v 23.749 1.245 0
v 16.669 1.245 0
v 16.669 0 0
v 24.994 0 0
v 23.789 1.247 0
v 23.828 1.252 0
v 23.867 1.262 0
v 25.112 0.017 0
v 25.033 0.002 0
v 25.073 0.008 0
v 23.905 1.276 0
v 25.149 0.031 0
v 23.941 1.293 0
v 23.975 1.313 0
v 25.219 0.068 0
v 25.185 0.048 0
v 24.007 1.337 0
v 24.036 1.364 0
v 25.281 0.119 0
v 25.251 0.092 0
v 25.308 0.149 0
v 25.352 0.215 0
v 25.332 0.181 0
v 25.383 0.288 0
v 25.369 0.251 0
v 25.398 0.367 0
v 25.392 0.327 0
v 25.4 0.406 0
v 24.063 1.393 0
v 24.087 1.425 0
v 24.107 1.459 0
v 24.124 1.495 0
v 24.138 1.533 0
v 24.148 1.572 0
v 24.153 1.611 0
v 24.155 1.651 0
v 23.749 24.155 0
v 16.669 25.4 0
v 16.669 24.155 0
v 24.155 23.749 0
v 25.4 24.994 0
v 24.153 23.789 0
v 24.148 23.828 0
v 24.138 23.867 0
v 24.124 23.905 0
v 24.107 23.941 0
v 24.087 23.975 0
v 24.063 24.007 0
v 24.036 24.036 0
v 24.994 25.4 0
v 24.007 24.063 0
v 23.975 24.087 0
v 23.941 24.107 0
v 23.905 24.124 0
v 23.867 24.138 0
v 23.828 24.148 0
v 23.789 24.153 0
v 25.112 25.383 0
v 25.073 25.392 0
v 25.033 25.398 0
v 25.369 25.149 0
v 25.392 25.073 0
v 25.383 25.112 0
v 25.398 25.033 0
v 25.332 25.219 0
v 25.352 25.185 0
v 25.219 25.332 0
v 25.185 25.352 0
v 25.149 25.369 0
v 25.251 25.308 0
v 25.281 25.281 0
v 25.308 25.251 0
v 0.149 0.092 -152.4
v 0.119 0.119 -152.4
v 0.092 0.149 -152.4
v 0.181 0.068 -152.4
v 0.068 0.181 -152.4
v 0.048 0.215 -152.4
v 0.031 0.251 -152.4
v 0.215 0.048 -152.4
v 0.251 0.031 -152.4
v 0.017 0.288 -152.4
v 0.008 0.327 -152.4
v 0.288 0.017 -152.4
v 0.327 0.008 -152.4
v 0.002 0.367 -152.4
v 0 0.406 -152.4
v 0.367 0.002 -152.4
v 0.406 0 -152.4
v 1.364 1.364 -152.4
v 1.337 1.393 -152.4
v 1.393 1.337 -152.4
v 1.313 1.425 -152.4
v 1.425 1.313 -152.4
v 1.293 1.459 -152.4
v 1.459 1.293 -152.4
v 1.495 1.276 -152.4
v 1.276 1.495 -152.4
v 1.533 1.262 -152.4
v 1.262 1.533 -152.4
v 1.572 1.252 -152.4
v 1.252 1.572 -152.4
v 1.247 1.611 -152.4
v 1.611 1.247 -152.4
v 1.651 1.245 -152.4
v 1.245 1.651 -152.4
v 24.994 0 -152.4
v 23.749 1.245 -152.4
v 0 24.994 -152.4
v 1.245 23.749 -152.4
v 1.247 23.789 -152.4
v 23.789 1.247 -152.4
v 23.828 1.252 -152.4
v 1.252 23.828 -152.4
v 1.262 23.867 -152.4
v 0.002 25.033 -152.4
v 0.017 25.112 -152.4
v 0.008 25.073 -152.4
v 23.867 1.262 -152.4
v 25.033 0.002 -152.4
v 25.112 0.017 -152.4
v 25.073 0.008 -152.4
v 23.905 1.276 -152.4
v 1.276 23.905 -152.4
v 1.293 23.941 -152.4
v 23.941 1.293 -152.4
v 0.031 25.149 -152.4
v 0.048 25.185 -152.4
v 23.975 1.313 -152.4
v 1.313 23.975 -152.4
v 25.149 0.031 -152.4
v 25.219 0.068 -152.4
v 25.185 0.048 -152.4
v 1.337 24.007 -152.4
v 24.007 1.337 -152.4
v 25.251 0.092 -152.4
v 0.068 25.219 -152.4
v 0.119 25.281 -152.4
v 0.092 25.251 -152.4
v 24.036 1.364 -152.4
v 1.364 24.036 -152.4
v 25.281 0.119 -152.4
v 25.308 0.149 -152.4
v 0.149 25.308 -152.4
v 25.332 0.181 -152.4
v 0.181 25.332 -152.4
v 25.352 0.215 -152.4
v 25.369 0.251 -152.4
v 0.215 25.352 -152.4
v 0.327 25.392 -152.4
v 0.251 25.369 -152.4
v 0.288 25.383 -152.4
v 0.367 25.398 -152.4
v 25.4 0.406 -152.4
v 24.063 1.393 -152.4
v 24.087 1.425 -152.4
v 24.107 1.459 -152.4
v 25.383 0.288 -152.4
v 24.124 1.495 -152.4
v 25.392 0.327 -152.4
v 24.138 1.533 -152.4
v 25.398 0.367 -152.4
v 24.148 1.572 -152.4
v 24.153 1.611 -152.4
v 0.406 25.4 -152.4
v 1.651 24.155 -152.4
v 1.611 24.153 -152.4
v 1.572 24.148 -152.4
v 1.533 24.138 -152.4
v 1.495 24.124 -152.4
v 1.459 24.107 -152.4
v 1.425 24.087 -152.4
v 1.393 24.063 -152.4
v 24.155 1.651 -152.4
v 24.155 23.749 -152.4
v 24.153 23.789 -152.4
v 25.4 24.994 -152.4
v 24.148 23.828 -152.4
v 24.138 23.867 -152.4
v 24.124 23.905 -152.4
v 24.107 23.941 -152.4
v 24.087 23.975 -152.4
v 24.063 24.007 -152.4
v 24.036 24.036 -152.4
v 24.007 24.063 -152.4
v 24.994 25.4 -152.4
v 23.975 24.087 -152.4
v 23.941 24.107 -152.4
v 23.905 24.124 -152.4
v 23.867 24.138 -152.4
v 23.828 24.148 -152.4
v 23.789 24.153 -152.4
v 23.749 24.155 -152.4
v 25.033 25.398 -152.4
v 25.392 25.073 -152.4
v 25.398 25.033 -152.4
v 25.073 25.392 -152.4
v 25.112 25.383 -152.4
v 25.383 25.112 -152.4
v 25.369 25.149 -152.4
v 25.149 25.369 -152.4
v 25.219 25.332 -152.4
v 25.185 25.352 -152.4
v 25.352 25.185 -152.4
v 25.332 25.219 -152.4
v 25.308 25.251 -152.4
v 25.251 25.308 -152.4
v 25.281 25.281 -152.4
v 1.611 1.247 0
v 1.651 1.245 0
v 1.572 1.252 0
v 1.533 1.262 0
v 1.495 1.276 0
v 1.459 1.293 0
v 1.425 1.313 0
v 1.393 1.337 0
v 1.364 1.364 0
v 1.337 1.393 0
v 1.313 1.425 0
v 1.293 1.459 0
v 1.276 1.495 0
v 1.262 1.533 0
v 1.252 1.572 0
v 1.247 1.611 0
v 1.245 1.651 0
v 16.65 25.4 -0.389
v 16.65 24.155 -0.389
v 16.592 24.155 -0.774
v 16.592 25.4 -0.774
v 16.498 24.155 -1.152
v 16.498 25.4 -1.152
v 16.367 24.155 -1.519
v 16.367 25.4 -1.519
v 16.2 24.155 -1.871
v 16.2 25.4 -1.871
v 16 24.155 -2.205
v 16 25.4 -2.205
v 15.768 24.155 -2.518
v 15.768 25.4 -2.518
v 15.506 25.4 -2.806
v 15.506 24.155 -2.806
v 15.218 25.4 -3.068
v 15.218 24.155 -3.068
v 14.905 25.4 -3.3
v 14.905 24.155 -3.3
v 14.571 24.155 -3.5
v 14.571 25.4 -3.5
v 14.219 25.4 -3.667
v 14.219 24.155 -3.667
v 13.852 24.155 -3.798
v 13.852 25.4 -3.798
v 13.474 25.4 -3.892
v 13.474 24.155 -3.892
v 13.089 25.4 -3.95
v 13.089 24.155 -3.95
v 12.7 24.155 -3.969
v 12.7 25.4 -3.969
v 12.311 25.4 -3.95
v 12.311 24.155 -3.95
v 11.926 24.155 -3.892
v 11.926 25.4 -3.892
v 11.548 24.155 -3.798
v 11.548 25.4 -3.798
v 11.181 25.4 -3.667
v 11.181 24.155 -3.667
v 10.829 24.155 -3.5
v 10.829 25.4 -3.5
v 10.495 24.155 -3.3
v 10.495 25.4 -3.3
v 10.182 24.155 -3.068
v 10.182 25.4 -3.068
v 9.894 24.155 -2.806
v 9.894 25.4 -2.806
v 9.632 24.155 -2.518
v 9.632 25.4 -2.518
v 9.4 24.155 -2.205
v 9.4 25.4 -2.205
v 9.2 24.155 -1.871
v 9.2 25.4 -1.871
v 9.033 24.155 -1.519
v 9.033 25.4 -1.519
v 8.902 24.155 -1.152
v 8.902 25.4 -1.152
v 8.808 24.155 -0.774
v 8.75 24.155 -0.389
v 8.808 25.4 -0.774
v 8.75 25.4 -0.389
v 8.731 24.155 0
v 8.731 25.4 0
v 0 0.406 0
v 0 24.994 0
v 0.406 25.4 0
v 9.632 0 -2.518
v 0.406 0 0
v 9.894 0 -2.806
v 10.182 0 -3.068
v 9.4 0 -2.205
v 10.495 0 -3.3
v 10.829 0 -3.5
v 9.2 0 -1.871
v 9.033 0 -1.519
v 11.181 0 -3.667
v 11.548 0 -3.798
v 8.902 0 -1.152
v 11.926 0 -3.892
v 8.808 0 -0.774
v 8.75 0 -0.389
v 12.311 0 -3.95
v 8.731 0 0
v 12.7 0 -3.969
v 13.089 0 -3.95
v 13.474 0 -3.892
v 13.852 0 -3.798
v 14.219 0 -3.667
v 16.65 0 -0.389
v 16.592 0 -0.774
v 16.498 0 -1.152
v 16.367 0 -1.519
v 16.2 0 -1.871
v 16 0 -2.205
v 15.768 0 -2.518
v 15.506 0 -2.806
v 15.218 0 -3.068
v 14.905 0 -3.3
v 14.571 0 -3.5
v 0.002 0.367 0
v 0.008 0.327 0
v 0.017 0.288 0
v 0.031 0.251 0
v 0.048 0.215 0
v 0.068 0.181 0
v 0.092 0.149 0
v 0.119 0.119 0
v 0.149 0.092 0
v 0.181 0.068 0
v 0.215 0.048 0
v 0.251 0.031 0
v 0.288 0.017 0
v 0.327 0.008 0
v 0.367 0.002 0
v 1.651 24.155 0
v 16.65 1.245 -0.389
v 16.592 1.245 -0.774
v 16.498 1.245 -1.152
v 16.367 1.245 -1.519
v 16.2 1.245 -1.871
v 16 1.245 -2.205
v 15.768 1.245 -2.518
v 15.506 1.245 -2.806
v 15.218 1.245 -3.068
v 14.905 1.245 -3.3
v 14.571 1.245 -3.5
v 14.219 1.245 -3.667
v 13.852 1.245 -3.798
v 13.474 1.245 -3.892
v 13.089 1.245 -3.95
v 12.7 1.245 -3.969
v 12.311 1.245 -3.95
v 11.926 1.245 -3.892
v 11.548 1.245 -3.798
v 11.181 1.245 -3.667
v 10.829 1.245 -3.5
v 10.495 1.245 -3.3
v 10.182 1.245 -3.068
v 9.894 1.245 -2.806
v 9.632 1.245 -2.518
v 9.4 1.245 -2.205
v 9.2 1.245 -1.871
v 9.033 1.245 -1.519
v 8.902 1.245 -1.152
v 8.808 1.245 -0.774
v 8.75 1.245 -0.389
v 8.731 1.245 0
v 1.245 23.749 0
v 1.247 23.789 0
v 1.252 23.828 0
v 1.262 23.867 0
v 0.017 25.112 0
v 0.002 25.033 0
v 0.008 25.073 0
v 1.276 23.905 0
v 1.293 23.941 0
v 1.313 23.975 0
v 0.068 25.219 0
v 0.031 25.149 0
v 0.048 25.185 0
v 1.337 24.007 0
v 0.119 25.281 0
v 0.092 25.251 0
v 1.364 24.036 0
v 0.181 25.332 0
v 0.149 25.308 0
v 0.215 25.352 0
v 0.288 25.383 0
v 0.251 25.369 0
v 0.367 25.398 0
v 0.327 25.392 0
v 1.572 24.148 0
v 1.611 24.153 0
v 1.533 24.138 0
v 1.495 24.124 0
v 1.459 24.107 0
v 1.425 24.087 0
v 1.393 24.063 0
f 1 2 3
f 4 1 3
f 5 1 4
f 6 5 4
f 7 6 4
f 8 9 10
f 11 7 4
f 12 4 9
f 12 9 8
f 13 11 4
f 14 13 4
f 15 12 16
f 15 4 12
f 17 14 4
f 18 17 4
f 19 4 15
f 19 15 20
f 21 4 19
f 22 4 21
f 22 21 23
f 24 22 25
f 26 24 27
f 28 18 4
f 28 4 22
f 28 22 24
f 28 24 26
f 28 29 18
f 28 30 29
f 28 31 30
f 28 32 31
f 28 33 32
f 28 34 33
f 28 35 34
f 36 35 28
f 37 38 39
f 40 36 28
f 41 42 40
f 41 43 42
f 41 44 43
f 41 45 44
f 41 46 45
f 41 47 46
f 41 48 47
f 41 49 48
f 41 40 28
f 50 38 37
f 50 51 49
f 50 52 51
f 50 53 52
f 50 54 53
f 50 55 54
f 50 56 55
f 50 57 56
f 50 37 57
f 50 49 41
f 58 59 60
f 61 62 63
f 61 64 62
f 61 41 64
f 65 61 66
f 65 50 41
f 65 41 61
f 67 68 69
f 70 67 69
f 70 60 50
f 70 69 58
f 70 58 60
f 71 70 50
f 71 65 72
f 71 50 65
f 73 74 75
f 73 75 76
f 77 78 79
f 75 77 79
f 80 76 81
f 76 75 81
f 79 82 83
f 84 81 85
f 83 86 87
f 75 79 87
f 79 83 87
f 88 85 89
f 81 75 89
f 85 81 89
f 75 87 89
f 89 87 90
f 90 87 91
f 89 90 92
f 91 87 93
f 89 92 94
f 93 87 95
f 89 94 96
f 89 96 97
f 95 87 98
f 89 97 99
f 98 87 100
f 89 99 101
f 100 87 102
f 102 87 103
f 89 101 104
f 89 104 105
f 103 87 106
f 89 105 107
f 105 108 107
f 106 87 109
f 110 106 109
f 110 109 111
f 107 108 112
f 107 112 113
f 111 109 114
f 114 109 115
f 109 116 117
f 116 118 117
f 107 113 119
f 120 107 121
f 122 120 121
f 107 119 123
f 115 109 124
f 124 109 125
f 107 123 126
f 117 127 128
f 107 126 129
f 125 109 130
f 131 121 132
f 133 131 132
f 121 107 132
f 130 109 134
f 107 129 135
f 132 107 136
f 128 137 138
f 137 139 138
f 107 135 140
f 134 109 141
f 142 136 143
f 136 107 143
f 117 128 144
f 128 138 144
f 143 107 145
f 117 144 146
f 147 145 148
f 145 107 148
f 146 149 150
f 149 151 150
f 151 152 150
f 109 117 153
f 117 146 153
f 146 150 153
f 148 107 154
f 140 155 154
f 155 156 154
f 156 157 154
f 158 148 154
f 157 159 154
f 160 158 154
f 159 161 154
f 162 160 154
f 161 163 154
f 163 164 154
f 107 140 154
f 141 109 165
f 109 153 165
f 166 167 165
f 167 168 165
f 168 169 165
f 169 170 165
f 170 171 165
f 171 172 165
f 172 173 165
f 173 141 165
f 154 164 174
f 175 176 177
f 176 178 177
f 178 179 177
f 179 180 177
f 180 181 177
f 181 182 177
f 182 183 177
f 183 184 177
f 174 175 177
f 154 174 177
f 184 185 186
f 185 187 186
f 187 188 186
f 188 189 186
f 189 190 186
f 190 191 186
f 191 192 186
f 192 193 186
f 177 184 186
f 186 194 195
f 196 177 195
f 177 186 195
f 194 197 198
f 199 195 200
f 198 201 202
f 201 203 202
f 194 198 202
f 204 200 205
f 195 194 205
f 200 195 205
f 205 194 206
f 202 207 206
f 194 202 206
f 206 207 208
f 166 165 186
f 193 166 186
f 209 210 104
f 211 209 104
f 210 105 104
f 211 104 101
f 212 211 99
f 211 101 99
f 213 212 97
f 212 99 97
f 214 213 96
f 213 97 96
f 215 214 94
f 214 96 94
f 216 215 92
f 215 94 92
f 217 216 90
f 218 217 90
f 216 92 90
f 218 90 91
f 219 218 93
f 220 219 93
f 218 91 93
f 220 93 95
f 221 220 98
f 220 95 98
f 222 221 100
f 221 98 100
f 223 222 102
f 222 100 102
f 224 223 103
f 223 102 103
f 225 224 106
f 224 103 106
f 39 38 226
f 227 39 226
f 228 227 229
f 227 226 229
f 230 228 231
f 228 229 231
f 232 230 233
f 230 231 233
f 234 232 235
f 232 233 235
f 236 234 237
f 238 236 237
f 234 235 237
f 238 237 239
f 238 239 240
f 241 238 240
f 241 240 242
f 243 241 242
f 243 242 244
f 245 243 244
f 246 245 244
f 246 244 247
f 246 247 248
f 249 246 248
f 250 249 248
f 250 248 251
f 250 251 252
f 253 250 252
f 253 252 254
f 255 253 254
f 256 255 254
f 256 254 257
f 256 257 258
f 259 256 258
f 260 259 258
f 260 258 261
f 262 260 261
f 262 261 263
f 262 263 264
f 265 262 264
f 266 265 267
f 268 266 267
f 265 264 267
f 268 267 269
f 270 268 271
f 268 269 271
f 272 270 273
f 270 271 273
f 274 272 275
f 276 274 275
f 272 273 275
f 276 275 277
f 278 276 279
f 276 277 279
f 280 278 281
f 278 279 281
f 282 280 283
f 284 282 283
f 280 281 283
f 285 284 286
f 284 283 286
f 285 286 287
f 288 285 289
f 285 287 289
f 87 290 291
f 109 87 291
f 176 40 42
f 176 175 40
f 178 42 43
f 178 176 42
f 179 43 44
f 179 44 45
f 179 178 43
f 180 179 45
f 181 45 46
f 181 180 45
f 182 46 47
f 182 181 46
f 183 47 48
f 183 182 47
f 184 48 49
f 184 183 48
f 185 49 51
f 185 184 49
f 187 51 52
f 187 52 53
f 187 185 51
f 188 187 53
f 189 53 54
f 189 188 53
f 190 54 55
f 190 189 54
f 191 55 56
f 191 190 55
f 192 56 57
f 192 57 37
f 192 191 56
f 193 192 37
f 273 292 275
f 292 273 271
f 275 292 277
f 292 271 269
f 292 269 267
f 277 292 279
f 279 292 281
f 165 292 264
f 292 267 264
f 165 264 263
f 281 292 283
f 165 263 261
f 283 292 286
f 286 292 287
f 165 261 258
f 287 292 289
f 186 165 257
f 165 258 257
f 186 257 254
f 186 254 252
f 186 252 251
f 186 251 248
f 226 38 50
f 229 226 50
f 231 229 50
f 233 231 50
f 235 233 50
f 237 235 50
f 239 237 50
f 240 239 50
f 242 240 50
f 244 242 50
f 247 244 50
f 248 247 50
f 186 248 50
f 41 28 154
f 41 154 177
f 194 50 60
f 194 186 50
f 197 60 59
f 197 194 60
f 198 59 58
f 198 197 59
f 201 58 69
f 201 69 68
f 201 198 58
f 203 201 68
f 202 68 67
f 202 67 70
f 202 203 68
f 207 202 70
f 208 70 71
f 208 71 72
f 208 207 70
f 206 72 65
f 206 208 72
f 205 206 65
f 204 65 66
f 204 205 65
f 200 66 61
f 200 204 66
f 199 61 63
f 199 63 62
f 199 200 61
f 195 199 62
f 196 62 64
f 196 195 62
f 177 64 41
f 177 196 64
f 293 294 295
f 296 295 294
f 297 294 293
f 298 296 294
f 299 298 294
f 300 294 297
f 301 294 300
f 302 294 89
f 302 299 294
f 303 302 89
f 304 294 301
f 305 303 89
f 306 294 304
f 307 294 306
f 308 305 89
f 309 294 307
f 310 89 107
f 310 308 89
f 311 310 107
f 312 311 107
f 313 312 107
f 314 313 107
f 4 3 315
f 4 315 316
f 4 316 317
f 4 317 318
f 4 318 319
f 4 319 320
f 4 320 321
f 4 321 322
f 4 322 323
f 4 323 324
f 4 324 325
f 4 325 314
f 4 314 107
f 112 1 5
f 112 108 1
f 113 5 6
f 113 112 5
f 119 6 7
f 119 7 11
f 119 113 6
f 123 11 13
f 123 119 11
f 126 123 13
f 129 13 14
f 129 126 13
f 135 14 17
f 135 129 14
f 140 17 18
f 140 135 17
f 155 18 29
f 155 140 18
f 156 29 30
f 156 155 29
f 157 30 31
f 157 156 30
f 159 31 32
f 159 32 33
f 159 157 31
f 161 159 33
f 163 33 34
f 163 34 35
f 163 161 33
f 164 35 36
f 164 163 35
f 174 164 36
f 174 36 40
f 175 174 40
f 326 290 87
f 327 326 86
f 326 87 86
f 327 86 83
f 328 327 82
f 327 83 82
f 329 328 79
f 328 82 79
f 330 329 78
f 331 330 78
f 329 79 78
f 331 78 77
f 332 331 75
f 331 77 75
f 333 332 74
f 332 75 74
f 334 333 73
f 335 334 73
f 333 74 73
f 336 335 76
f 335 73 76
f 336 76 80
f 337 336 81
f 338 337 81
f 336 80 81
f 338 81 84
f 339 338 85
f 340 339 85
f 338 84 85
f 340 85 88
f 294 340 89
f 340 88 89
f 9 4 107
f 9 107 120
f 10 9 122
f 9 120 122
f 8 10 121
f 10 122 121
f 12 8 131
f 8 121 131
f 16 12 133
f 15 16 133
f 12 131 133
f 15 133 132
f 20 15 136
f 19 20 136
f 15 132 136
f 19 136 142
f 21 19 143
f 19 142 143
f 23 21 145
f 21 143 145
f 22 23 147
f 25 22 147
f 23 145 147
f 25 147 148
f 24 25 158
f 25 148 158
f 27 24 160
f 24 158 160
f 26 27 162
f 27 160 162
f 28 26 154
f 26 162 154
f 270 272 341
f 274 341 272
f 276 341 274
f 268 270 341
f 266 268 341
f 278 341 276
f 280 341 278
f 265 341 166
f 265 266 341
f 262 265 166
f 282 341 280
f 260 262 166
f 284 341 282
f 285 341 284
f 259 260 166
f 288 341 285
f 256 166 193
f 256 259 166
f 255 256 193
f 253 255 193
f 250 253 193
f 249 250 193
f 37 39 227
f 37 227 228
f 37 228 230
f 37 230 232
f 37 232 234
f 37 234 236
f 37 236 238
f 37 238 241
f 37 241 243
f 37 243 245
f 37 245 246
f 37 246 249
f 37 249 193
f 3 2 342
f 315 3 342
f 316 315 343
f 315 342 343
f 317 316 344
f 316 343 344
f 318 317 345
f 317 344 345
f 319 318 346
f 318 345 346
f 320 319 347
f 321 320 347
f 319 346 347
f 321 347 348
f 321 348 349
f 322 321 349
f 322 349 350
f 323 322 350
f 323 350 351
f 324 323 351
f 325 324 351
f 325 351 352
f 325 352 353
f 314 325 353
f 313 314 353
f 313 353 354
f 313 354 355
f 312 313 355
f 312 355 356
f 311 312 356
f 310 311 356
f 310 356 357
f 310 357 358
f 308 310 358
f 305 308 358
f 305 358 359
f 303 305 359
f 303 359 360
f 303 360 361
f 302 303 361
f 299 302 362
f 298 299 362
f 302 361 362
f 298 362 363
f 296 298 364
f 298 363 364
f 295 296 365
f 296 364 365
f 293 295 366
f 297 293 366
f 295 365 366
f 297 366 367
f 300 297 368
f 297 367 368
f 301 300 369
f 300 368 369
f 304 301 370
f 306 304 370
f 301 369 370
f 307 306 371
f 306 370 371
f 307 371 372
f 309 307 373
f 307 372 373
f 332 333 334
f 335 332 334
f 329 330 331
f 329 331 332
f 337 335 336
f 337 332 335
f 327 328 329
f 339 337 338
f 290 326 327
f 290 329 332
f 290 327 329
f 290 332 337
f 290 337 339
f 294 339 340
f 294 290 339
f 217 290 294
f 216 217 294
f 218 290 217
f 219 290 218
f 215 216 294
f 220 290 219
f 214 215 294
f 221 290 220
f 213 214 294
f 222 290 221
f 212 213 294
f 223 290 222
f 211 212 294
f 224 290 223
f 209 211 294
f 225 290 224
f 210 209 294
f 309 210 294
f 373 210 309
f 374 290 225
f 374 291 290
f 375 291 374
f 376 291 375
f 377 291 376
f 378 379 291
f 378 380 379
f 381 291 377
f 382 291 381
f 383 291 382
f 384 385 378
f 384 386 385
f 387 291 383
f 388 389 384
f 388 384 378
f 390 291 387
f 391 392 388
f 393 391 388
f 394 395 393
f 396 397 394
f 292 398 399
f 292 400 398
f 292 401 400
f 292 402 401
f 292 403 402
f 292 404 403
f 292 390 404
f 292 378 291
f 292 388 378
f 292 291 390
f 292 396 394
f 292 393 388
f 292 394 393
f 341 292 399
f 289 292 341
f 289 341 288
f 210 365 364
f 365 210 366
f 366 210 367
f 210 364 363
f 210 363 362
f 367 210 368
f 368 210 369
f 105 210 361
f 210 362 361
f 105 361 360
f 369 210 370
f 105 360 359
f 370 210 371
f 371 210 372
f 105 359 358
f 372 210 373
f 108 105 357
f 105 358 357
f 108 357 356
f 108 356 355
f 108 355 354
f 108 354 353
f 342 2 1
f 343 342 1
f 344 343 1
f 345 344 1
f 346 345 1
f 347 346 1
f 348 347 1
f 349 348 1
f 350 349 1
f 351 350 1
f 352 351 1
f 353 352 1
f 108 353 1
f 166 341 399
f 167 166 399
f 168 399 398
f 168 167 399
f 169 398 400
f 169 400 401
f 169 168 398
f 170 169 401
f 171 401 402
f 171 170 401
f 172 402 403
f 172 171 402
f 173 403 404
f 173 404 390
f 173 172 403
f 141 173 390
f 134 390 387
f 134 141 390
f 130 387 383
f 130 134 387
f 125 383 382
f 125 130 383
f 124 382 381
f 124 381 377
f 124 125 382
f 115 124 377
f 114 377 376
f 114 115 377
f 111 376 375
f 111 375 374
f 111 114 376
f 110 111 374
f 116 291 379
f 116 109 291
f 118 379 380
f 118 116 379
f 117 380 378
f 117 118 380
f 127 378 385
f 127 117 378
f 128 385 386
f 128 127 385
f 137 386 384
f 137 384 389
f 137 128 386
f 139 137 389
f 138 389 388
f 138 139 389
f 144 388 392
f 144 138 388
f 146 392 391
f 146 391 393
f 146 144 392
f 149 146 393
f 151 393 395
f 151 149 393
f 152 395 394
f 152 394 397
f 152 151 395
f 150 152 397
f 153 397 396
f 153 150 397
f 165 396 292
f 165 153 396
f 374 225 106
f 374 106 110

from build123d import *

# Parameters (mm, degrees)
SKETCH1_W           = 25.4
SKETCH1_H           = 25.4
SKETCH1_W_2         = 22.9108
SKETCH1_H_2         = 22.9108
BOSS_EXTRUDE1_DEPTH = 152.4
FILLET1_R           = 0.4064
FILLET2_R           = 0.4064
SKETCH2_R           = 3.96875
CUT_EXTRUDE1_DEPTH  = 157.576115675


with BuildPart() as part:
    # Sketch1 → Boss-Extrude1 (new body)
    with BuildSketch(Plane.XY):
        with Locations((12.7, 12.7)):
            Rectangle(SKETCH1_W, SKETCH1_H)
        with Locations((12.7, 12.7)):
            Rectangle(SKETCH1_W_2, SKETCH1_H_2, mode=Mode.SUBTRACT)
    extrude(amount=-BOSS_EXTRUDE1_DEPTH)

    # Fillet1
    fillet1_edges = [part.edges().sort_by_distance(p)[0] for p in [
        (0, 25.4, -76.2),
        (25.4, 25.4, -76.2),
        (25.4, 0, -76.2),
        (0, 0, -76.2),
    ]]
    fillet(fillet1_edges, radius=FILLET1_R)

    # Fillet2
    fillet2_edges = [part.edges().sort_by_distance(p)[0] for p in [
        (1.2446, 1.2446, -76.2),
        (1.2446, 24.1554, -76.2),
        (24.1554, 24.1554, -76.2),
        (24.1554, 1.2446, -76.2),
    ]]
    fillet(fillet2_edges, radius=FILLET2_R)

    # Sketch2 → Cut-Extrude1 (cut, through all)
    with BuildSketch(Plane(origin=(0, 25.4, 0), x_dir=(1, 0, 0), z_dir=(0, 1, 0))):
        with Locations((12.7, 0)):
            Circle(SKETCH2_R)
    extrude(amount=-CUT_EXTRUDE1_DEPTH, mode=Mode.SUBTRACT)


solid = part.part
